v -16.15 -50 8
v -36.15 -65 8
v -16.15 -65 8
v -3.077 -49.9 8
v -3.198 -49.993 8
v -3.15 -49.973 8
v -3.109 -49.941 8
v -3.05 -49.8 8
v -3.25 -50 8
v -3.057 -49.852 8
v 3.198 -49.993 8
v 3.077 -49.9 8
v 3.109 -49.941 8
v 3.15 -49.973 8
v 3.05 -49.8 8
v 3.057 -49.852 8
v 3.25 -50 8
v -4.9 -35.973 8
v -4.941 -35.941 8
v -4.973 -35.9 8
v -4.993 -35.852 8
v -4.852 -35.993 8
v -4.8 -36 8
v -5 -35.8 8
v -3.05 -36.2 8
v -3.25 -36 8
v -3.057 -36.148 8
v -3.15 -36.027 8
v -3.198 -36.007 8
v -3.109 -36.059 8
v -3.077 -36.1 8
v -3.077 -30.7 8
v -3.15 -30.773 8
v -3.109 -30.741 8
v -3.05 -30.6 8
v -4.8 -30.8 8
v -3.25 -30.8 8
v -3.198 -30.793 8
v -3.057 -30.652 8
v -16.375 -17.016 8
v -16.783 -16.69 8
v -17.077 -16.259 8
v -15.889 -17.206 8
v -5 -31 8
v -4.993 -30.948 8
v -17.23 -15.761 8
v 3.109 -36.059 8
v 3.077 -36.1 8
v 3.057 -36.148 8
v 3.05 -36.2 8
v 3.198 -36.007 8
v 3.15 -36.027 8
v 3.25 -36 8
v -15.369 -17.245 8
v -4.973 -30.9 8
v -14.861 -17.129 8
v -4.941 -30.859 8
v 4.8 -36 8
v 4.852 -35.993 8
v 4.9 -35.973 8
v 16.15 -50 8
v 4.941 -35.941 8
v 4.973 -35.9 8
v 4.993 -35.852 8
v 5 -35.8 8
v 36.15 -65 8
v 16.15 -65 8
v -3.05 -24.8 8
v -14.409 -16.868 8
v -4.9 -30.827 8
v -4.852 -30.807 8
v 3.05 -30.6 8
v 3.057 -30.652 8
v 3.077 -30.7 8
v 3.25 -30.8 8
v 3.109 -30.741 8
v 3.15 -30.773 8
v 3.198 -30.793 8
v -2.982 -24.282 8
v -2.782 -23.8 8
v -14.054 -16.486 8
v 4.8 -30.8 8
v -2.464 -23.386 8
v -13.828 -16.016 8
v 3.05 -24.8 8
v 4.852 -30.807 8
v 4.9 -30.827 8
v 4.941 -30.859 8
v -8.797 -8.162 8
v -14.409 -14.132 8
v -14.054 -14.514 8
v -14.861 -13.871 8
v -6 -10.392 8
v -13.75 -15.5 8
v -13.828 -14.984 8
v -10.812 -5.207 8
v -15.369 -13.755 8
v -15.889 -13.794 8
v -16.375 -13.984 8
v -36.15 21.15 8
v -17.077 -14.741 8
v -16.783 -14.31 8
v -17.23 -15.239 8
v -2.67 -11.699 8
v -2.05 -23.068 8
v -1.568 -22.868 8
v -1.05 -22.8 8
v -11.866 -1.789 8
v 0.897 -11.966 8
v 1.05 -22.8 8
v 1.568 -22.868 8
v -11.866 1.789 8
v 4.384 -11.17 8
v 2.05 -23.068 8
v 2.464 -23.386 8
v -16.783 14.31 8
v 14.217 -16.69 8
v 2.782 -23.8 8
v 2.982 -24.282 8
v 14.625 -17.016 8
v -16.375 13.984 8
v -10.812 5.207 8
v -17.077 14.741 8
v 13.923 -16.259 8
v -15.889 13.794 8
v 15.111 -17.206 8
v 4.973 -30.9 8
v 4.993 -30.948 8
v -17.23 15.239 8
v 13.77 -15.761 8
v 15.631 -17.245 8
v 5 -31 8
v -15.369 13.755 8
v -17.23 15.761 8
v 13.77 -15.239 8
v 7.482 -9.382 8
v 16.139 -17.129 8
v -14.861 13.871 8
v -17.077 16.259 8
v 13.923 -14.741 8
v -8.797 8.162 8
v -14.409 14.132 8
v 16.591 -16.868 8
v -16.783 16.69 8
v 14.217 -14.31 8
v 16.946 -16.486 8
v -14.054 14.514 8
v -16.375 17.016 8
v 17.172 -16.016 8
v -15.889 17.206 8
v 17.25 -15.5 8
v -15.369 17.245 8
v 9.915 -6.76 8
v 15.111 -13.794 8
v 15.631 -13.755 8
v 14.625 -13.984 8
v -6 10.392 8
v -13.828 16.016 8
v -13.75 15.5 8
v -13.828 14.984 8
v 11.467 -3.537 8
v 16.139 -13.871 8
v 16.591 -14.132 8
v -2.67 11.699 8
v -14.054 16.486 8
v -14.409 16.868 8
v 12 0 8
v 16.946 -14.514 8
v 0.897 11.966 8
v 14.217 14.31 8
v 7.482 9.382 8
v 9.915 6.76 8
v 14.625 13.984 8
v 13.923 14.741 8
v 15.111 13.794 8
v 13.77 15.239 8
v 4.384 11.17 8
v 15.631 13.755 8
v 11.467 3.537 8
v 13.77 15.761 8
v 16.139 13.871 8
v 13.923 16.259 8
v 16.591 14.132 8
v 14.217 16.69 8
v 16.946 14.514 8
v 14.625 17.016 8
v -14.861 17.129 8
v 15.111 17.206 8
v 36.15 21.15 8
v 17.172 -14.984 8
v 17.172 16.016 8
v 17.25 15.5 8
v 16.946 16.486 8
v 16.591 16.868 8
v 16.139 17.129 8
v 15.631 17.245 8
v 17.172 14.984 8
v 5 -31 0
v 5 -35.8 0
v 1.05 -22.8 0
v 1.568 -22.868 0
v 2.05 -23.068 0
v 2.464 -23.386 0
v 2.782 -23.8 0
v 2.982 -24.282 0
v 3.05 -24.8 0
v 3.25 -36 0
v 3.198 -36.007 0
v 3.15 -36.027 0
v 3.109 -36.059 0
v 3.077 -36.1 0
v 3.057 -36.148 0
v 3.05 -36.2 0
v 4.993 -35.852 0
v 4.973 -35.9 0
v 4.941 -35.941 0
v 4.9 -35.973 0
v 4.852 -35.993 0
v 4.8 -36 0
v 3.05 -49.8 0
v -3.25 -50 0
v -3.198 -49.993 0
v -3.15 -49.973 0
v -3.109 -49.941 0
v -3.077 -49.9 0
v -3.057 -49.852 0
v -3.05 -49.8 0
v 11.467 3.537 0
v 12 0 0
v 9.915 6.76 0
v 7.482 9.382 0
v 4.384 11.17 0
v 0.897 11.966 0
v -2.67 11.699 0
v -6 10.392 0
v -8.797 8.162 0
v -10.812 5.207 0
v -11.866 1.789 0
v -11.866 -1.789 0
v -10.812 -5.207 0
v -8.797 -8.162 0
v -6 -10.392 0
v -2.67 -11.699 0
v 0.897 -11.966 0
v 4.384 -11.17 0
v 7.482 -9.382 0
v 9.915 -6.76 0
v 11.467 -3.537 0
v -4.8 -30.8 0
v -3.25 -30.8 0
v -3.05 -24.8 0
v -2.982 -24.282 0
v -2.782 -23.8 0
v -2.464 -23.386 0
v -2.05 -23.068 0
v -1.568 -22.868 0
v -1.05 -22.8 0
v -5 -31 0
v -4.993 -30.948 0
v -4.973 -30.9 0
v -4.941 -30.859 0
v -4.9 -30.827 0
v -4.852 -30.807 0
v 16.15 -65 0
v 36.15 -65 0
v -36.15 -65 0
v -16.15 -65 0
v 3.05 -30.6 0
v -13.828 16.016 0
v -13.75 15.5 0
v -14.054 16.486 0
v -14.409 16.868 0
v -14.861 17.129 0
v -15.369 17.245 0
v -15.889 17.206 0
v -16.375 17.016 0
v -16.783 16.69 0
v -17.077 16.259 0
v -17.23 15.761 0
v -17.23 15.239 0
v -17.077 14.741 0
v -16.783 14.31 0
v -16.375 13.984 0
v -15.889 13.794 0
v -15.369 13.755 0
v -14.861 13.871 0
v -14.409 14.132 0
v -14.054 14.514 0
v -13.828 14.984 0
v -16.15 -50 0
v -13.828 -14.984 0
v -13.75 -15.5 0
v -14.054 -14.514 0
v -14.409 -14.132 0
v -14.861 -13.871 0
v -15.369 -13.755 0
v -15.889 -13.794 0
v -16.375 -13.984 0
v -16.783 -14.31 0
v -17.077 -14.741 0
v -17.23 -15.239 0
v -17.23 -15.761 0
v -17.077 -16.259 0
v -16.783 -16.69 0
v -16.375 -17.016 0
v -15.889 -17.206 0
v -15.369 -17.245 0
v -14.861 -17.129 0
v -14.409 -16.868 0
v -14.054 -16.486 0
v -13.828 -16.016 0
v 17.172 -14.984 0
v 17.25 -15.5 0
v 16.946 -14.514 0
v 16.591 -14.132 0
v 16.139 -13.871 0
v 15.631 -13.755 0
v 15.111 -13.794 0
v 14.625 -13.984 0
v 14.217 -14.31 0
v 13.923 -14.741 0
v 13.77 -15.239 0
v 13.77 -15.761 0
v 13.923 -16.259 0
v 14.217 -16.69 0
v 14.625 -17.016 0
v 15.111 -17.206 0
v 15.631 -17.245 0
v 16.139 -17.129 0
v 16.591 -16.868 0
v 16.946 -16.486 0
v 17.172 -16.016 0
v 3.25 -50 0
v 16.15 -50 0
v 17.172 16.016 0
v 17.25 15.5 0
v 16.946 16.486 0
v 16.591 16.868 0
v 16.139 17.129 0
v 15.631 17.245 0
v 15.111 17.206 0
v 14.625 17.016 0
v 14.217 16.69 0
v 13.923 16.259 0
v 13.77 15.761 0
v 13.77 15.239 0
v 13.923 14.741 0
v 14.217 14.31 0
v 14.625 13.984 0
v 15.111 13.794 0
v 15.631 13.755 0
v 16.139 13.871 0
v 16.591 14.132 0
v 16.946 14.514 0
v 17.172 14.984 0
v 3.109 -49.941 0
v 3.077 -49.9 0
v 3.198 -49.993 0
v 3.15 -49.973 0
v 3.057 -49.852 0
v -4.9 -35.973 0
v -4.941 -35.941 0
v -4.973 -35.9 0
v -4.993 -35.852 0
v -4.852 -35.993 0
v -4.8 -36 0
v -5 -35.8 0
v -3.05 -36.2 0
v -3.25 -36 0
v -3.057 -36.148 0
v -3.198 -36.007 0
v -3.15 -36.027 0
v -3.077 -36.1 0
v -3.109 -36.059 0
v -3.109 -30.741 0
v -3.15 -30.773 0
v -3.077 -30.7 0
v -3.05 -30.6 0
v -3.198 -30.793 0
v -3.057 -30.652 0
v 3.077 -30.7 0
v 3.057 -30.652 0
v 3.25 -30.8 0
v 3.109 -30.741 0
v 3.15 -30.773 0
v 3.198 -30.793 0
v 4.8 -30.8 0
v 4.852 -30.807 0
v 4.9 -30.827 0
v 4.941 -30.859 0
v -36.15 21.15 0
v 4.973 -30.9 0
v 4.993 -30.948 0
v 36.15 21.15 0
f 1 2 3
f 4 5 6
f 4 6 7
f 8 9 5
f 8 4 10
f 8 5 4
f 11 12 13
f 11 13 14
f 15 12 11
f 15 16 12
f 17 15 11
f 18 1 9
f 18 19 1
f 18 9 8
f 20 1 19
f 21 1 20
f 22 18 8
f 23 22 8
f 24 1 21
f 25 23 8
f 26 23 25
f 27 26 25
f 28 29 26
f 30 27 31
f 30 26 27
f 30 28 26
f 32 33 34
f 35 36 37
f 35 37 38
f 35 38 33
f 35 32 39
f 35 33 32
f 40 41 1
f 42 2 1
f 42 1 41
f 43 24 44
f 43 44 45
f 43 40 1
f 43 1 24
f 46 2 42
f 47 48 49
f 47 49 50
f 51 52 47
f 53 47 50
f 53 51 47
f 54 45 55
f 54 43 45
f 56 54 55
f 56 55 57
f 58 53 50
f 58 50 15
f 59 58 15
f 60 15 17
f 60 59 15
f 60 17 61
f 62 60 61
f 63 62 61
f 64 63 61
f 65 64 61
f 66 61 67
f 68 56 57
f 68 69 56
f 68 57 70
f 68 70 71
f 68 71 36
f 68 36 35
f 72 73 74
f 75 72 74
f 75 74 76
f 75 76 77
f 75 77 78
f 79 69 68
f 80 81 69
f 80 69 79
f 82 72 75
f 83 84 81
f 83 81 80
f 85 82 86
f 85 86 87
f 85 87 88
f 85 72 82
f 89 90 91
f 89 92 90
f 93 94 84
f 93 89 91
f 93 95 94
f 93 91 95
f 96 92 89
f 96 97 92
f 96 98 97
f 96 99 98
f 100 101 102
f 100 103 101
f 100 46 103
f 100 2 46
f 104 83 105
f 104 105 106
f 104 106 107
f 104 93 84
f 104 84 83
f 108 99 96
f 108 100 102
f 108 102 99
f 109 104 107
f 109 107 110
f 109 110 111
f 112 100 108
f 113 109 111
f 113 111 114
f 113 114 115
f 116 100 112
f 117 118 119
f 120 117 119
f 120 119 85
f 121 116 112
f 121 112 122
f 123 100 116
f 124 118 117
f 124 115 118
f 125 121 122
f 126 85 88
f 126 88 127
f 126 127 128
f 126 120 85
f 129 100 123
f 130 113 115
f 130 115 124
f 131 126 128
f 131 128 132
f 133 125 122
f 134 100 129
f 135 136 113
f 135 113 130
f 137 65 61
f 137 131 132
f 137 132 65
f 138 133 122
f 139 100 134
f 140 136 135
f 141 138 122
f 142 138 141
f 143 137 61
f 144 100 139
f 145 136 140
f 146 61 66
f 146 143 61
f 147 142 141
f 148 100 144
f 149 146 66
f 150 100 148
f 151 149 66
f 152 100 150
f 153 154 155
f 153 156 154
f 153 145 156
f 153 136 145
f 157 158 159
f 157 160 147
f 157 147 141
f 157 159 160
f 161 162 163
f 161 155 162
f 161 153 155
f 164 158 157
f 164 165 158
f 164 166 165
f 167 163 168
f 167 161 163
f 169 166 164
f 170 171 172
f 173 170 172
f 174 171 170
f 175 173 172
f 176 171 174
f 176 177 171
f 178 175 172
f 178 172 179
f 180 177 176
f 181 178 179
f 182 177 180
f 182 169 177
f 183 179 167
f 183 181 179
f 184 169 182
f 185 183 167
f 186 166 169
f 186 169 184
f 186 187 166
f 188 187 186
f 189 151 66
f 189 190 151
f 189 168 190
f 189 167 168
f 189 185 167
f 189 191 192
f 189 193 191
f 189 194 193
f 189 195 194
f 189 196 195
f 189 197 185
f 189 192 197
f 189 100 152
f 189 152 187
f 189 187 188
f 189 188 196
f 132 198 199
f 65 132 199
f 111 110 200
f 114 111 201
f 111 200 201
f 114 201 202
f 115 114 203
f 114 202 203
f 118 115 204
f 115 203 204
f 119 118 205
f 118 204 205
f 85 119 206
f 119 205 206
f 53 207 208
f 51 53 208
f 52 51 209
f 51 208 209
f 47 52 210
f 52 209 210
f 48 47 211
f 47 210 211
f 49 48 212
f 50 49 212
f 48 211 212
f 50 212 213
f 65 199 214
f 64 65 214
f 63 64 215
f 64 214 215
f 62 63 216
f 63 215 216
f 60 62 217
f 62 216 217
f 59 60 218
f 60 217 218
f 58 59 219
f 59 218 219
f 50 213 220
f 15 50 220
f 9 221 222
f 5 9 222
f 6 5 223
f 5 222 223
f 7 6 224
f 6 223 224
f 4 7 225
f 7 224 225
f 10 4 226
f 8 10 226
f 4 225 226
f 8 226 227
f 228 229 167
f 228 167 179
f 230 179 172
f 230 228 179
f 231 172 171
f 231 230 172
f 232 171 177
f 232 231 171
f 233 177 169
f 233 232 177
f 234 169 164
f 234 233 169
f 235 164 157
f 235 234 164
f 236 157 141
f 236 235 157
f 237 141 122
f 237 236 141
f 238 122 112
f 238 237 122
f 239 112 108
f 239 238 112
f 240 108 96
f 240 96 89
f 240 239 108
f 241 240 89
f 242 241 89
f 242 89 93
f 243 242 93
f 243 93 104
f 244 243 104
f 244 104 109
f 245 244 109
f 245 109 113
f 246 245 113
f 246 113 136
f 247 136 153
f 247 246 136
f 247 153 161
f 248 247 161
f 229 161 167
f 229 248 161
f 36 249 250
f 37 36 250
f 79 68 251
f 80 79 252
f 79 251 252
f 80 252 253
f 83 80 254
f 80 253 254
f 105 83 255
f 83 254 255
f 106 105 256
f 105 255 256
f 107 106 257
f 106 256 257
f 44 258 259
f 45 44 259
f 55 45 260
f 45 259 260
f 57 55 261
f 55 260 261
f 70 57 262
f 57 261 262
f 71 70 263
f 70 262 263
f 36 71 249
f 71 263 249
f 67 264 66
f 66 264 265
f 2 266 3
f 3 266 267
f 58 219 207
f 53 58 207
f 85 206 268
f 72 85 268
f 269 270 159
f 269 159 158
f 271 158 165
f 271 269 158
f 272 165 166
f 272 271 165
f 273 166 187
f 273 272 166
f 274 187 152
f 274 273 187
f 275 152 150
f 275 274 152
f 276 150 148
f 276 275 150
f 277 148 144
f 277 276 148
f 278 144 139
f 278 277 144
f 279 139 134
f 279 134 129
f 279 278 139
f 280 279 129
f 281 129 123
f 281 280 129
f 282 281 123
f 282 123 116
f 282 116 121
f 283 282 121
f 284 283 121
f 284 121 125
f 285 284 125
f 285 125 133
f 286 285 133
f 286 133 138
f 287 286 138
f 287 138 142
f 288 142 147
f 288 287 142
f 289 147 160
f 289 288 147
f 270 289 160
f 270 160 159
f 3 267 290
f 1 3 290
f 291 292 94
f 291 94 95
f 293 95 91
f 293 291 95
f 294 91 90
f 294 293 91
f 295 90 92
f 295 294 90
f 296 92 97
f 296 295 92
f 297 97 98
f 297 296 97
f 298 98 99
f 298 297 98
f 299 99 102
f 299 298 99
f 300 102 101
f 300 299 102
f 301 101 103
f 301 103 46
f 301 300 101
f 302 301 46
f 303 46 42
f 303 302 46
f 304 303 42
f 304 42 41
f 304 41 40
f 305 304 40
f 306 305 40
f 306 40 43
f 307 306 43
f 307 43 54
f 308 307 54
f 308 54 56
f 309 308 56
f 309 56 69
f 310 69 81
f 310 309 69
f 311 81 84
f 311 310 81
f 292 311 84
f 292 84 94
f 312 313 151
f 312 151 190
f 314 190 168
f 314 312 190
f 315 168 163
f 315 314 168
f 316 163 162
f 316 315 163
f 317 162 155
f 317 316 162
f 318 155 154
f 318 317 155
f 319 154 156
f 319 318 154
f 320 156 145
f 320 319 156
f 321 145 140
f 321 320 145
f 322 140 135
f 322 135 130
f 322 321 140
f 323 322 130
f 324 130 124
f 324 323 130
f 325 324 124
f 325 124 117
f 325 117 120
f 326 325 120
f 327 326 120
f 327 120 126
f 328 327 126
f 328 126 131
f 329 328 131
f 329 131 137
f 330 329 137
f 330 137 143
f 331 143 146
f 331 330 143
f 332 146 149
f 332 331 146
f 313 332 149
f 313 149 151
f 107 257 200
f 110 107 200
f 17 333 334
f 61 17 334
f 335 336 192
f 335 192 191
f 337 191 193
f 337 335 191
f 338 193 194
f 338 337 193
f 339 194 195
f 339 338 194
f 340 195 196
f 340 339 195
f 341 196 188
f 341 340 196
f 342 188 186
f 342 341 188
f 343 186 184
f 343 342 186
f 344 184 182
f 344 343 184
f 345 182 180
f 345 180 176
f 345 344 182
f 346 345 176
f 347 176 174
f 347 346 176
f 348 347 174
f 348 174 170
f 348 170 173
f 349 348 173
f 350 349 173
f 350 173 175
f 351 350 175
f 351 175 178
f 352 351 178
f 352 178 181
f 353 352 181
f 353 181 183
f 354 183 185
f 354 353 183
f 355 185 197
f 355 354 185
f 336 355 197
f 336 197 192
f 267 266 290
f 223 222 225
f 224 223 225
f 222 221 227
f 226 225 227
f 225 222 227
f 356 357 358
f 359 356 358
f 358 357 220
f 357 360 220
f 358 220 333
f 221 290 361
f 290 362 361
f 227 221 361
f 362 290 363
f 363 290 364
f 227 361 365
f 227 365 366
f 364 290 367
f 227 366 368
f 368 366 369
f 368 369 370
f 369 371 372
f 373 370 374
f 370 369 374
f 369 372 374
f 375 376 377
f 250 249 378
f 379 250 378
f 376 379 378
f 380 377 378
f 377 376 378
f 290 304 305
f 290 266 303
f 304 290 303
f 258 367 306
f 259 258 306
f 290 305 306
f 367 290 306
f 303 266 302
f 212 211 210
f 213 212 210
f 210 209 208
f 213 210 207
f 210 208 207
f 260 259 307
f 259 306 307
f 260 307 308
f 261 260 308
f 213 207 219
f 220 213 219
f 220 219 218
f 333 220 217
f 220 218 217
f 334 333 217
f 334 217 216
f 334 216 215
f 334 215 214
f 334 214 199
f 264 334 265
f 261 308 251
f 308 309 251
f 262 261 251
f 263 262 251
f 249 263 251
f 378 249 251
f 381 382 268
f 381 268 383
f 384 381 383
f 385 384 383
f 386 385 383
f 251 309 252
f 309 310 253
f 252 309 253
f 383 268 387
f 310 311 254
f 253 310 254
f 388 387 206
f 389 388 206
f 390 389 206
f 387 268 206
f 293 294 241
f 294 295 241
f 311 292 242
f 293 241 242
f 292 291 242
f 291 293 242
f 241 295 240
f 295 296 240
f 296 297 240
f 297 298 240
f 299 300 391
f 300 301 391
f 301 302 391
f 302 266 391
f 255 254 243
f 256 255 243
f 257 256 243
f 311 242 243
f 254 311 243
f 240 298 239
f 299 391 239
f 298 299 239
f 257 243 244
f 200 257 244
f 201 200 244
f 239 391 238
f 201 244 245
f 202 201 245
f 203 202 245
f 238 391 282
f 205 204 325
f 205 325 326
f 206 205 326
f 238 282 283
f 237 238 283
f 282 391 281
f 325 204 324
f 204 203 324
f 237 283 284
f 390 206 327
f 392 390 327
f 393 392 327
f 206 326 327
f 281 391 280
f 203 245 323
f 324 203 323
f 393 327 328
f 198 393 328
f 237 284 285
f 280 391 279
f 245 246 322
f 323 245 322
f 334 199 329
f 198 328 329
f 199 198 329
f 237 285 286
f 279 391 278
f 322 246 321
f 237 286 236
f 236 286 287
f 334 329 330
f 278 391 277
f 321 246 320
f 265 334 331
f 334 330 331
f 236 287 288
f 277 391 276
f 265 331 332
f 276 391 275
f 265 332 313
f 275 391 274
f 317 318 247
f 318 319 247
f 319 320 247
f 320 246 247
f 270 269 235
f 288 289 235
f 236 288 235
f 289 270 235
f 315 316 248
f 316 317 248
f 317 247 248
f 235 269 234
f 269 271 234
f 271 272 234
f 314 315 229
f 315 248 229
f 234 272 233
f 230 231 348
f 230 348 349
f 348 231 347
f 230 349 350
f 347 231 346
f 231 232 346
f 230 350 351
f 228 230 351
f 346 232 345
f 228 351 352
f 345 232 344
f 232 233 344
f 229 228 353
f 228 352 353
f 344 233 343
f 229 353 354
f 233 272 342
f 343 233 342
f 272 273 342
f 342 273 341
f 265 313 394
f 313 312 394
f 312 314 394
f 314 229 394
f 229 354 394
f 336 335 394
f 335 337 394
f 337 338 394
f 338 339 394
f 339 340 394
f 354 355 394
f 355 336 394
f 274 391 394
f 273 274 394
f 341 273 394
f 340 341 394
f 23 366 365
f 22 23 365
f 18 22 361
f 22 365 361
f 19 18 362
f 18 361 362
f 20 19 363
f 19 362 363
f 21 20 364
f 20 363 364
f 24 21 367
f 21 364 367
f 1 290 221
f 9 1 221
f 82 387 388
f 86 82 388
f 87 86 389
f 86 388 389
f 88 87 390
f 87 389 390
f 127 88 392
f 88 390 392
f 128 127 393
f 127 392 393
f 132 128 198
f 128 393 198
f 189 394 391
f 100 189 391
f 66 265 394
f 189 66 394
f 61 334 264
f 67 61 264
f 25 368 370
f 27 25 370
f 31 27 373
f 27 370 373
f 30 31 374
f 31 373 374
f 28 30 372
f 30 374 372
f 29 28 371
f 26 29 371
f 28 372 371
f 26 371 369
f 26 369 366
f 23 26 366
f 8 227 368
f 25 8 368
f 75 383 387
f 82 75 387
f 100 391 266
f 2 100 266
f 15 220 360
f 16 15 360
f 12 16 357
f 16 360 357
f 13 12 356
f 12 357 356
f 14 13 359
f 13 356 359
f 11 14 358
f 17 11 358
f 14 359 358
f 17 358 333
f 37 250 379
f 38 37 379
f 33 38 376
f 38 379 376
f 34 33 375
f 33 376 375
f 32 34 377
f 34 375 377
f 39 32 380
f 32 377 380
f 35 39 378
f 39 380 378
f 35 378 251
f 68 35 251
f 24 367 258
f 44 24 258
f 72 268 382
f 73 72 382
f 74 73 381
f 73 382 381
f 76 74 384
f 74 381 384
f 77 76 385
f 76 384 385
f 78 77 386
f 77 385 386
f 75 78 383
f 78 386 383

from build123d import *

# Parameters (mm, degrees)
SKETCH1_R           = 12
SKETCH1_R_2         = 1.75
BOSS_EXTRUDE1_DEPTH = 8


with BuildPart() as part:
    # Sketch1 → Boss-Extrude1 (new body)
    with BuildSketch(Plane.XY):
        with BuildLine():
            Line((36.15, 21.15), (-36.15, 21.15))
            Line((-36.15, 21.15), (-36.15, -57))
            Line((-36.15, -57), (-36.15, -65))
            Line((-36.15, -65), (-16.15, -65))
            Line((-16.15, -65), (-16.15, -50))
            Line((-16.15, -50), (-3.25, -50))
            ThreePointArc((-3.25, -50), (-3.108578644, -49.941421356), (-3.05, -49.8))
            Line((-3.05, -49.8), (-3.05, -36.2))
            ThreePointArc((-3.05, -36.2), (-3.108578644, -36.058578644), (-3.25, -36))
            Line((-3.25, -36), (-4.8, -36))
            ThreePointArc((-4.8, -36), (-4.941421356, -35.941421356), (-5, -35.8))
            Line((-5, -35.8), (-5, -31))
            ThreePointArc((-5, -31), (-4.941421356, -30.858578644), (-4.8, -30.8))
            Line((-4.8, -30.8), (-3.25, -30.8))
            ThreePointArc((-3.25, -30.8), (-3.108578644, -30.741421356), (-3.05, -30.6))
            Line((-3.05, -30.6), (-3.05, -24.8))
            ThreePointArc((-3.05, -24.8), (-2.464213562, -23.385786438), (-1.05, -22.8))
            Line((-1.05, -22.8), (1.05, -22.8))
            ThreePointArc((1.05, -22.8), (2.464213562, -23.385786438), (3.05, -24.8))
            Line((3.05, -24.8), (3.05, -30.6))
            ThreePointArc((3.05, -30.6), (3.108578644, -30.741421356), (3.25, -30.8))
            Line((3.25, -30.8), (4.8, -30.8))
            ThreePointArc((4.8, -30.8), (4.941421356, -30.858578644), (5, -31))
            Line((5, -31), (5, -35.8))
            ThreePointArc((5, -35.8), (4.941421356, -35.941421356), (4.8, -36))
            Line((4.8, -36), (3.25, -36))
            ThreePointArc((3.25, -36), (3.108578644, -36.058578644), (3.05, -36.2))
            Line((3.05, -36.2), (3.05, -49.8))
            ThreePointArc((3.05, -49.8), (3.108578644, -49.941421356), (3.25, -50))
            Line((3.25, -50), (16.15, -50))
            Line((16.15, -50), (16.15, -65))
            Line((16.15, -65), (36.15, -65))
            Line((36.15, -65), (36.15, -57))
            Line((36.15, -57), (36.15, 21.15))
        make_face()
        Circle(SKETCH1_R, mode=Mode.SUBTRACT)
        with Locations((-15.5, 15.5)):
            Circle(SKETCH1_R_2, mode=Mode.SUBTRACT)
        with Locations((15.5, 15.5)):
            Circle(SKETCH1_R_2, mode=Mode.SUBTRACT)
        with Locations((15.5, -15.5)):
            Circle(SKETCH1_R_2, mode=Mode.SUBTRACT)
        with Locations((-15.5, -15.5)):
            Circle(SKETCH1_R_2, mode=Mode.SUBTRACT)
    extrude(amount=BOSS_EXTRUDE1_DEPTH)


solid = part.part
